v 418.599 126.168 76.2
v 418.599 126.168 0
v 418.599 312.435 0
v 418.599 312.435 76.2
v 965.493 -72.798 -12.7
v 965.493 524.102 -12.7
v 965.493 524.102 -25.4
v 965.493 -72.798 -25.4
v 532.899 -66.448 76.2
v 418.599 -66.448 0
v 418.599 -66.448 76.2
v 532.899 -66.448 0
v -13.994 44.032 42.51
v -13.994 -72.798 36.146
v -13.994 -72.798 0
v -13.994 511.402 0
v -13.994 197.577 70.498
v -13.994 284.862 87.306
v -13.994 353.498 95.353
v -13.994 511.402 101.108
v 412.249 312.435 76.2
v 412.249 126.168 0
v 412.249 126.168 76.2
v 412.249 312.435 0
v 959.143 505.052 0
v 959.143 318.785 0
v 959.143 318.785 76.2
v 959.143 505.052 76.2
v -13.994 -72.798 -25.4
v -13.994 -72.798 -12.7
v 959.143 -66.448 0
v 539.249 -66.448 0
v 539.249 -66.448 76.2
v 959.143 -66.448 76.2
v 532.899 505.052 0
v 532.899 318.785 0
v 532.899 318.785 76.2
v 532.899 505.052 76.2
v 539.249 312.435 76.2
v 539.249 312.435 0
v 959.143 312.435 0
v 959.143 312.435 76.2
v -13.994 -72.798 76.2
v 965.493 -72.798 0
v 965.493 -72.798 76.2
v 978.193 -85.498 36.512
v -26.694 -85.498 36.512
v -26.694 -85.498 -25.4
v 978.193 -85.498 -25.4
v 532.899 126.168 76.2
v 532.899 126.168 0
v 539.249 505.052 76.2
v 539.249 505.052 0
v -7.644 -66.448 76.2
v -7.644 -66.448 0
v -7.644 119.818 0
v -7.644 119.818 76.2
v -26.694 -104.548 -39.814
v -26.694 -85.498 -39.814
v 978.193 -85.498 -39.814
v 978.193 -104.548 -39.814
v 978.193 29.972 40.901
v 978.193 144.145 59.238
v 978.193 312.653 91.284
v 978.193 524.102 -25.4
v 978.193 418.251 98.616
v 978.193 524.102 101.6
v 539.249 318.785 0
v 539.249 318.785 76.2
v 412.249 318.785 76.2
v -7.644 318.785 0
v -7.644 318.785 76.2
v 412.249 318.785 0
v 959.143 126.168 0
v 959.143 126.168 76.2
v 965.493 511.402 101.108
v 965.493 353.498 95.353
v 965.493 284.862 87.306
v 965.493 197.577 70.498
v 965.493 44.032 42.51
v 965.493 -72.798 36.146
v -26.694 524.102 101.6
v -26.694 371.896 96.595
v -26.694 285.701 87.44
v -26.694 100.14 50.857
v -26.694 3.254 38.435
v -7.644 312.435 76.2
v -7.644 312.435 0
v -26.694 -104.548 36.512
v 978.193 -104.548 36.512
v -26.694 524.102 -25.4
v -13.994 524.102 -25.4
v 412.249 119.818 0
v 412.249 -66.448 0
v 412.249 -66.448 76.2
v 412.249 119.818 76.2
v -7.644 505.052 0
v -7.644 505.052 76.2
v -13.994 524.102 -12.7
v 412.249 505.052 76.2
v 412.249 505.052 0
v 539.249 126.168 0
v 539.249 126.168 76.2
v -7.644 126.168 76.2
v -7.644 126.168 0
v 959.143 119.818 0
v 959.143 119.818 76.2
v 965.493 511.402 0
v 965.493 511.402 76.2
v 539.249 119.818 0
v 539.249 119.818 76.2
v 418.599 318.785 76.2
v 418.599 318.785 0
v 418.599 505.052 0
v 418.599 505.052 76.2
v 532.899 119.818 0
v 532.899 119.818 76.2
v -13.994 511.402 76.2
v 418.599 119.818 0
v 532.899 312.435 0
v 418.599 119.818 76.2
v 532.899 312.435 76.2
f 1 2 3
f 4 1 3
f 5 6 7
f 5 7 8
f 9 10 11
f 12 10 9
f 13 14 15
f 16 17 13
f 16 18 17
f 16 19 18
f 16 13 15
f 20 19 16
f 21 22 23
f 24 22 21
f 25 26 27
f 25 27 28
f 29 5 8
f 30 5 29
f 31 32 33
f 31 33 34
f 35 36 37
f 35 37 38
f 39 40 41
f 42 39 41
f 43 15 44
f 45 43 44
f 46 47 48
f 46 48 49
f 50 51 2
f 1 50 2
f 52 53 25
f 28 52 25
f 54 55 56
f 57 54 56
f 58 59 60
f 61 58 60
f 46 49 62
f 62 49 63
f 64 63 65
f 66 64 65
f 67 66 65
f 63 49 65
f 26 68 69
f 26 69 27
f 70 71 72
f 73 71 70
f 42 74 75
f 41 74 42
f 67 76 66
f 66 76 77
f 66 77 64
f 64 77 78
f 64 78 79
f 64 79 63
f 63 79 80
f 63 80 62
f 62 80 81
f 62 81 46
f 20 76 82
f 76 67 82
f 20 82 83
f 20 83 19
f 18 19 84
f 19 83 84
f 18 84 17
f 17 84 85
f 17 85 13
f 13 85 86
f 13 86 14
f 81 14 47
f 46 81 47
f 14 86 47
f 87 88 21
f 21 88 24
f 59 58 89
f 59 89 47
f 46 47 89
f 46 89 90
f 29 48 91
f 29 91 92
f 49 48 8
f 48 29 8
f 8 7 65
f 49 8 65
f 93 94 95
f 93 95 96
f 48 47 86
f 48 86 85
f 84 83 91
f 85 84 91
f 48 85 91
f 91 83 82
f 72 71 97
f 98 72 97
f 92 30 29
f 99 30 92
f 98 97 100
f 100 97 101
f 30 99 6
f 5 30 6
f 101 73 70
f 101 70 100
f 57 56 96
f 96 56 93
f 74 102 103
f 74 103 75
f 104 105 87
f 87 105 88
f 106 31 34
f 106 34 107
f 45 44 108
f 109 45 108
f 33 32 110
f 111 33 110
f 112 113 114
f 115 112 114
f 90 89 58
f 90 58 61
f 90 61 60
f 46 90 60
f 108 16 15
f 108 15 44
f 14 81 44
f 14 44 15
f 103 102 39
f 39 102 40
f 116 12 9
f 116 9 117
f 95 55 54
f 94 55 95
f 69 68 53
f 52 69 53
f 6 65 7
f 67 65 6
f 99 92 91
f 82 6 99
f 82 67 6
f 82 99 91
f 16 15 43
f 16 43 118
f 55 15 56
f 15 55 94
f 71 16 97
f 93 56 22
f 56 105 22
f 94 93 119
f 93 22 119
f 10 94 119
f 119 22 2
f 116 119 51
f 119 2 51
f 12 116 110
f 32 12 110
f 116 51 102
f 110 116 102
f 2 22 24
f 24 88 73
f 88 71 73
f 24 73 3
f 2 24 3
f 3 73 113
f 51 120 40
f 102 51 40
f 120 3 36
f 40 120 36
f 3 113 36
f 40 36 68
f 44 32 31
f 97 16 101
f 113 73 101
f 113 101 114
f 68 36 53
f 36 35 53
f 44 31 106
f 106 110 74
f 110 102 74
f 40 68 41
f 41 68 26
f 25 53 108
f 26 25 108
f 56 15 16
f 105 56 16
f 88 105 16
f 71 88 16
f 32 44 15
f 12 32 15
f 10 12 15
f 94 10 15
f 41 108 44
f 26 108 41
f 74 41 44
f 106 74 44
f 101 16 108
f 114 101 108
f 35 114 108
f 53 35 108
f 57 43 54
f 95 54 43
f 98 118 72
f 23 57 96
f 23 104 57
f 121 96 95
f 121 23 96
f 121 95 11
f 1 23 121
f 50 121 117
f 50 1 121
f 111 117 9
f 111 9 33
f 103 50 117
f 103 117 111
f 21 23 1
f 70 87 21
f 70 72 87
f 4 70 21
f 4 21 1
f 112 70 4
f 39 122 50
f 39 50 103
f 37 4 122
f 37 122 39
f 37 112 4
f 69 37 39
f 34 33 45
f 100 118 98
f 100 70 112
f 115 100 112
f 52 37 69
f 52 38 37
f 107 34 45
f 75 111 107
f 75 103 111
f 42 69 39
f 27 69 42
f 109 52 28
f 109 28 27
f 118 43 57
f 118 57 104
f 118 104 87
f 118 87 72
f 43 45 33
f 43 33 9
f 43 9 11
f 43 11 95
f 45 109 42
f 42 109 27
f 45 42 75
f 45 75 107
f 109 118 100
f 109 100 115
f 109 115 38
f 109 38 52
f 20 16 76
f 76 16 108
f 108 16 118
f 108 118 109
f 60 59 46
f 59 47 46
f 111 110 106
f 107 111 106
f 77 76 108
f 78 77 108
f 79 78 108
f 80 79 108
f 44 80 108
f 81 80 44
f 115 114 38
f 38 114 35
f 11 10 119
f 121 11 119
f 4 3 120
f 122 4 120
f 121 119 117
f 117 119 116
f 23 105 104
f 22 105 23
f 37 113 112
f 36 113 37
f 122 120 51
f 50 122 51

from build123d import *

# Parameters (mm, degrees)
F0_W     = 979.4875
F0_H     = 12.7
F1_DEPTH = 101.6
F2_DEPTH = 25.4
F3_W     = 1004.8875
F3_H     = 609.6
F3_W_2   = 419.89375
F3_H_2   = 186.2666666667
F4_DEPTH = 12.7
F6_DEPTH = 1004.8885
F0_W_2   = 1004.8875
F0_H_2   = 19.05
F7_DEPTH = 36.5125
F8_DEPTH = 39.8145
F0_H_3   = 584.2
F0_W_3   = 419.89375
F0_H_4   = 186.2666666667
F0_W_4   = 114.3
F0_W_5   = 419.8937565804
F9_DEPTH = 76.2


with BuildPart() as f1:
    # F0 (on Top) → F1 (new body)
    with BuildSketch(Plane.XY):
        Polygon((-13.9944232941, 524.1015708923), (-26.6944232941, 524.1015708923), (-26.6944232941, -85.4984291077), (978.1930767059, -85.4984291077), (978.1930767059, 524.1015708923), (965.4930767059, 524.1015708923), (965.4930767059, 511.4015708923), (965.4930767059, -72.7984291077), (-13.9944232941, -72.7984291077), (-13.9944232941, 511.4015708923), align=None)
        with Locations((475.7493267059, 517.7515708923)):
            Rectangle(F0_W, F0_H)
    extrude(amount=F1_DEPTH)

    # F0 (on Top) → F2 (join)
    with BuildSketch(Plane.XY):
        Polygon((-13.9944232941, 524.1015708923), (-26.6944232941, 524.1015708923), (-26.6944232941, -85.4984291077), (978.1930767059, -85.4984291077), (978.1930767059, 524.1015708923), (965.4930767059, 524.1015708923), (965.4930767059, 511.4015708923), (965.4930767059, -72.7984291077), (-13.9944232941, -72.7984291077), (-13.9944232941, 511.4015708923), align=None)
    extrude(amount=-F2_DEPTH)

    # F3 (on face) → F4 (join)
    with BuildSketch(Plane.XY):
        with Locations((475.7493267059, 219.3015708923)):
            Rectangle(F3_W, F3_H)
        with Locations((749.1962017059, 411.918237559)):
            Rectangle(F3_W_2, F3_H_2, mode=Mode.SUBTRACT)
        with Locations((749.1962017059, 411.918237559)):
            Rectangle(F3_W_2, F3_H_2)
    extrude(amount=-F4_DEPTH)

    # F5 (on face) → F6 (cut, through all)
    with BuildSketch(Plane(origin=(-26.6944232941, 0, 0), x_dir=(0, -1, 0), z_dir=(-1, 0, 0))):
        with BuildLine():
            Line((85.4984291077, 101.6), (-524.1015708923, 101.6))
            add(Edge.make_bspline(
                [(-524.1015708923, 101.6), (-454.3829336776, 98.6535593443), (-315.5144360565, 101.3463644472), (-114.7516219339, 48.2200810371), (18.7137848875, 33.9810080981), (85.4984291077, 36.5125)],
                knots=[0, 0, 0, 0, 0.3360631231, 0.6706250277, 1, 1, 1, 1], degree=3))
            Line((85.4984291077, 36.5125), (85.4984291077, 101.6))
        make_face()
    extrude(amount=-F6_DEPTH, mode=Mode.SUBTRACT)


with BuildPart() as f7:
    # F0 (on Top) → F7 (new body)
    with BuildSketch(Plane.XY):
        with Locations((475.7493267059, -95.0234291077)):
            Rectangle(F0_W_2, F0_H_2)
    extrude(amount=F7_DEPTH)

    # F0 (on Top) → F8 (join)
    with BuildSketch(Plane.XY):
        with Locations((475.7493267059, -95.0234291077)):
            Rectangle(F0_W_2, F0_H_2)
    extrude(amount=-F8_DEPTH)


with BuildPart() as f9:
    # F0 (on Top) → F9 (new body)
    with BuildSketch(Plane.XY):
        with Locations((475.7493267059, 219.3015708923)):
            Rectangle(F0_W, F0_H_3)
        with Locations((202.3024517059, 26.6849042257)):
            Rectangle(F0_W_3, F0_H_4, mode=Mode.SUBTRACT)
        with Locations((475.7493267059, 26.6849042257)):
            Rectangle(F0_W_4, F0_H_4, mode=Mode.SUBTRACT)
        with Locations((749.1962017059, 26.6849042257)):
            Rectangle(F0_W_3, F0_H_4, mode=Mode.SUBTRACT)
        with Locations((202.3024517059, 219.3015708923)):
            Rectangle(F0_W_3, F0_H_4, mode=Mode.SUBTRACT)
        with Locations((202.3024517059, 411.918237559)):
            Rectangle(F0_W_3, F0_H_4, mode=Mode.SUBTRACT)
        Polygon((418.5993267059, 312.4349042257), (532.8993267059, 312.4349042257), (532.8993267059, 293.2371660391), (532.8993267059, 126.168237559), (418.5993267059, 126.168237559), align=None, mode=Mode.SUBTRACT)
        with Locations((749.1961984158, 219.3015708923)):
            Rectangle(F0_W_5, F0_H_4, mode=Mode.SUBTRACT)
        with Locations((475.7493267059, 411.918237559)):
            Rectangle(F0_W_4, F0_H_4, mode=Mode.SUBTRACT)
        with Locations((749.1962017059, 411.918237559)):
            Rectangle(F0_W_3, F0_H_4, mode=Mode.SUBTRACT)
    extrude(amount=F9_DEPTH)


solid = Compound([f1.part, f7.part, f9.part])
